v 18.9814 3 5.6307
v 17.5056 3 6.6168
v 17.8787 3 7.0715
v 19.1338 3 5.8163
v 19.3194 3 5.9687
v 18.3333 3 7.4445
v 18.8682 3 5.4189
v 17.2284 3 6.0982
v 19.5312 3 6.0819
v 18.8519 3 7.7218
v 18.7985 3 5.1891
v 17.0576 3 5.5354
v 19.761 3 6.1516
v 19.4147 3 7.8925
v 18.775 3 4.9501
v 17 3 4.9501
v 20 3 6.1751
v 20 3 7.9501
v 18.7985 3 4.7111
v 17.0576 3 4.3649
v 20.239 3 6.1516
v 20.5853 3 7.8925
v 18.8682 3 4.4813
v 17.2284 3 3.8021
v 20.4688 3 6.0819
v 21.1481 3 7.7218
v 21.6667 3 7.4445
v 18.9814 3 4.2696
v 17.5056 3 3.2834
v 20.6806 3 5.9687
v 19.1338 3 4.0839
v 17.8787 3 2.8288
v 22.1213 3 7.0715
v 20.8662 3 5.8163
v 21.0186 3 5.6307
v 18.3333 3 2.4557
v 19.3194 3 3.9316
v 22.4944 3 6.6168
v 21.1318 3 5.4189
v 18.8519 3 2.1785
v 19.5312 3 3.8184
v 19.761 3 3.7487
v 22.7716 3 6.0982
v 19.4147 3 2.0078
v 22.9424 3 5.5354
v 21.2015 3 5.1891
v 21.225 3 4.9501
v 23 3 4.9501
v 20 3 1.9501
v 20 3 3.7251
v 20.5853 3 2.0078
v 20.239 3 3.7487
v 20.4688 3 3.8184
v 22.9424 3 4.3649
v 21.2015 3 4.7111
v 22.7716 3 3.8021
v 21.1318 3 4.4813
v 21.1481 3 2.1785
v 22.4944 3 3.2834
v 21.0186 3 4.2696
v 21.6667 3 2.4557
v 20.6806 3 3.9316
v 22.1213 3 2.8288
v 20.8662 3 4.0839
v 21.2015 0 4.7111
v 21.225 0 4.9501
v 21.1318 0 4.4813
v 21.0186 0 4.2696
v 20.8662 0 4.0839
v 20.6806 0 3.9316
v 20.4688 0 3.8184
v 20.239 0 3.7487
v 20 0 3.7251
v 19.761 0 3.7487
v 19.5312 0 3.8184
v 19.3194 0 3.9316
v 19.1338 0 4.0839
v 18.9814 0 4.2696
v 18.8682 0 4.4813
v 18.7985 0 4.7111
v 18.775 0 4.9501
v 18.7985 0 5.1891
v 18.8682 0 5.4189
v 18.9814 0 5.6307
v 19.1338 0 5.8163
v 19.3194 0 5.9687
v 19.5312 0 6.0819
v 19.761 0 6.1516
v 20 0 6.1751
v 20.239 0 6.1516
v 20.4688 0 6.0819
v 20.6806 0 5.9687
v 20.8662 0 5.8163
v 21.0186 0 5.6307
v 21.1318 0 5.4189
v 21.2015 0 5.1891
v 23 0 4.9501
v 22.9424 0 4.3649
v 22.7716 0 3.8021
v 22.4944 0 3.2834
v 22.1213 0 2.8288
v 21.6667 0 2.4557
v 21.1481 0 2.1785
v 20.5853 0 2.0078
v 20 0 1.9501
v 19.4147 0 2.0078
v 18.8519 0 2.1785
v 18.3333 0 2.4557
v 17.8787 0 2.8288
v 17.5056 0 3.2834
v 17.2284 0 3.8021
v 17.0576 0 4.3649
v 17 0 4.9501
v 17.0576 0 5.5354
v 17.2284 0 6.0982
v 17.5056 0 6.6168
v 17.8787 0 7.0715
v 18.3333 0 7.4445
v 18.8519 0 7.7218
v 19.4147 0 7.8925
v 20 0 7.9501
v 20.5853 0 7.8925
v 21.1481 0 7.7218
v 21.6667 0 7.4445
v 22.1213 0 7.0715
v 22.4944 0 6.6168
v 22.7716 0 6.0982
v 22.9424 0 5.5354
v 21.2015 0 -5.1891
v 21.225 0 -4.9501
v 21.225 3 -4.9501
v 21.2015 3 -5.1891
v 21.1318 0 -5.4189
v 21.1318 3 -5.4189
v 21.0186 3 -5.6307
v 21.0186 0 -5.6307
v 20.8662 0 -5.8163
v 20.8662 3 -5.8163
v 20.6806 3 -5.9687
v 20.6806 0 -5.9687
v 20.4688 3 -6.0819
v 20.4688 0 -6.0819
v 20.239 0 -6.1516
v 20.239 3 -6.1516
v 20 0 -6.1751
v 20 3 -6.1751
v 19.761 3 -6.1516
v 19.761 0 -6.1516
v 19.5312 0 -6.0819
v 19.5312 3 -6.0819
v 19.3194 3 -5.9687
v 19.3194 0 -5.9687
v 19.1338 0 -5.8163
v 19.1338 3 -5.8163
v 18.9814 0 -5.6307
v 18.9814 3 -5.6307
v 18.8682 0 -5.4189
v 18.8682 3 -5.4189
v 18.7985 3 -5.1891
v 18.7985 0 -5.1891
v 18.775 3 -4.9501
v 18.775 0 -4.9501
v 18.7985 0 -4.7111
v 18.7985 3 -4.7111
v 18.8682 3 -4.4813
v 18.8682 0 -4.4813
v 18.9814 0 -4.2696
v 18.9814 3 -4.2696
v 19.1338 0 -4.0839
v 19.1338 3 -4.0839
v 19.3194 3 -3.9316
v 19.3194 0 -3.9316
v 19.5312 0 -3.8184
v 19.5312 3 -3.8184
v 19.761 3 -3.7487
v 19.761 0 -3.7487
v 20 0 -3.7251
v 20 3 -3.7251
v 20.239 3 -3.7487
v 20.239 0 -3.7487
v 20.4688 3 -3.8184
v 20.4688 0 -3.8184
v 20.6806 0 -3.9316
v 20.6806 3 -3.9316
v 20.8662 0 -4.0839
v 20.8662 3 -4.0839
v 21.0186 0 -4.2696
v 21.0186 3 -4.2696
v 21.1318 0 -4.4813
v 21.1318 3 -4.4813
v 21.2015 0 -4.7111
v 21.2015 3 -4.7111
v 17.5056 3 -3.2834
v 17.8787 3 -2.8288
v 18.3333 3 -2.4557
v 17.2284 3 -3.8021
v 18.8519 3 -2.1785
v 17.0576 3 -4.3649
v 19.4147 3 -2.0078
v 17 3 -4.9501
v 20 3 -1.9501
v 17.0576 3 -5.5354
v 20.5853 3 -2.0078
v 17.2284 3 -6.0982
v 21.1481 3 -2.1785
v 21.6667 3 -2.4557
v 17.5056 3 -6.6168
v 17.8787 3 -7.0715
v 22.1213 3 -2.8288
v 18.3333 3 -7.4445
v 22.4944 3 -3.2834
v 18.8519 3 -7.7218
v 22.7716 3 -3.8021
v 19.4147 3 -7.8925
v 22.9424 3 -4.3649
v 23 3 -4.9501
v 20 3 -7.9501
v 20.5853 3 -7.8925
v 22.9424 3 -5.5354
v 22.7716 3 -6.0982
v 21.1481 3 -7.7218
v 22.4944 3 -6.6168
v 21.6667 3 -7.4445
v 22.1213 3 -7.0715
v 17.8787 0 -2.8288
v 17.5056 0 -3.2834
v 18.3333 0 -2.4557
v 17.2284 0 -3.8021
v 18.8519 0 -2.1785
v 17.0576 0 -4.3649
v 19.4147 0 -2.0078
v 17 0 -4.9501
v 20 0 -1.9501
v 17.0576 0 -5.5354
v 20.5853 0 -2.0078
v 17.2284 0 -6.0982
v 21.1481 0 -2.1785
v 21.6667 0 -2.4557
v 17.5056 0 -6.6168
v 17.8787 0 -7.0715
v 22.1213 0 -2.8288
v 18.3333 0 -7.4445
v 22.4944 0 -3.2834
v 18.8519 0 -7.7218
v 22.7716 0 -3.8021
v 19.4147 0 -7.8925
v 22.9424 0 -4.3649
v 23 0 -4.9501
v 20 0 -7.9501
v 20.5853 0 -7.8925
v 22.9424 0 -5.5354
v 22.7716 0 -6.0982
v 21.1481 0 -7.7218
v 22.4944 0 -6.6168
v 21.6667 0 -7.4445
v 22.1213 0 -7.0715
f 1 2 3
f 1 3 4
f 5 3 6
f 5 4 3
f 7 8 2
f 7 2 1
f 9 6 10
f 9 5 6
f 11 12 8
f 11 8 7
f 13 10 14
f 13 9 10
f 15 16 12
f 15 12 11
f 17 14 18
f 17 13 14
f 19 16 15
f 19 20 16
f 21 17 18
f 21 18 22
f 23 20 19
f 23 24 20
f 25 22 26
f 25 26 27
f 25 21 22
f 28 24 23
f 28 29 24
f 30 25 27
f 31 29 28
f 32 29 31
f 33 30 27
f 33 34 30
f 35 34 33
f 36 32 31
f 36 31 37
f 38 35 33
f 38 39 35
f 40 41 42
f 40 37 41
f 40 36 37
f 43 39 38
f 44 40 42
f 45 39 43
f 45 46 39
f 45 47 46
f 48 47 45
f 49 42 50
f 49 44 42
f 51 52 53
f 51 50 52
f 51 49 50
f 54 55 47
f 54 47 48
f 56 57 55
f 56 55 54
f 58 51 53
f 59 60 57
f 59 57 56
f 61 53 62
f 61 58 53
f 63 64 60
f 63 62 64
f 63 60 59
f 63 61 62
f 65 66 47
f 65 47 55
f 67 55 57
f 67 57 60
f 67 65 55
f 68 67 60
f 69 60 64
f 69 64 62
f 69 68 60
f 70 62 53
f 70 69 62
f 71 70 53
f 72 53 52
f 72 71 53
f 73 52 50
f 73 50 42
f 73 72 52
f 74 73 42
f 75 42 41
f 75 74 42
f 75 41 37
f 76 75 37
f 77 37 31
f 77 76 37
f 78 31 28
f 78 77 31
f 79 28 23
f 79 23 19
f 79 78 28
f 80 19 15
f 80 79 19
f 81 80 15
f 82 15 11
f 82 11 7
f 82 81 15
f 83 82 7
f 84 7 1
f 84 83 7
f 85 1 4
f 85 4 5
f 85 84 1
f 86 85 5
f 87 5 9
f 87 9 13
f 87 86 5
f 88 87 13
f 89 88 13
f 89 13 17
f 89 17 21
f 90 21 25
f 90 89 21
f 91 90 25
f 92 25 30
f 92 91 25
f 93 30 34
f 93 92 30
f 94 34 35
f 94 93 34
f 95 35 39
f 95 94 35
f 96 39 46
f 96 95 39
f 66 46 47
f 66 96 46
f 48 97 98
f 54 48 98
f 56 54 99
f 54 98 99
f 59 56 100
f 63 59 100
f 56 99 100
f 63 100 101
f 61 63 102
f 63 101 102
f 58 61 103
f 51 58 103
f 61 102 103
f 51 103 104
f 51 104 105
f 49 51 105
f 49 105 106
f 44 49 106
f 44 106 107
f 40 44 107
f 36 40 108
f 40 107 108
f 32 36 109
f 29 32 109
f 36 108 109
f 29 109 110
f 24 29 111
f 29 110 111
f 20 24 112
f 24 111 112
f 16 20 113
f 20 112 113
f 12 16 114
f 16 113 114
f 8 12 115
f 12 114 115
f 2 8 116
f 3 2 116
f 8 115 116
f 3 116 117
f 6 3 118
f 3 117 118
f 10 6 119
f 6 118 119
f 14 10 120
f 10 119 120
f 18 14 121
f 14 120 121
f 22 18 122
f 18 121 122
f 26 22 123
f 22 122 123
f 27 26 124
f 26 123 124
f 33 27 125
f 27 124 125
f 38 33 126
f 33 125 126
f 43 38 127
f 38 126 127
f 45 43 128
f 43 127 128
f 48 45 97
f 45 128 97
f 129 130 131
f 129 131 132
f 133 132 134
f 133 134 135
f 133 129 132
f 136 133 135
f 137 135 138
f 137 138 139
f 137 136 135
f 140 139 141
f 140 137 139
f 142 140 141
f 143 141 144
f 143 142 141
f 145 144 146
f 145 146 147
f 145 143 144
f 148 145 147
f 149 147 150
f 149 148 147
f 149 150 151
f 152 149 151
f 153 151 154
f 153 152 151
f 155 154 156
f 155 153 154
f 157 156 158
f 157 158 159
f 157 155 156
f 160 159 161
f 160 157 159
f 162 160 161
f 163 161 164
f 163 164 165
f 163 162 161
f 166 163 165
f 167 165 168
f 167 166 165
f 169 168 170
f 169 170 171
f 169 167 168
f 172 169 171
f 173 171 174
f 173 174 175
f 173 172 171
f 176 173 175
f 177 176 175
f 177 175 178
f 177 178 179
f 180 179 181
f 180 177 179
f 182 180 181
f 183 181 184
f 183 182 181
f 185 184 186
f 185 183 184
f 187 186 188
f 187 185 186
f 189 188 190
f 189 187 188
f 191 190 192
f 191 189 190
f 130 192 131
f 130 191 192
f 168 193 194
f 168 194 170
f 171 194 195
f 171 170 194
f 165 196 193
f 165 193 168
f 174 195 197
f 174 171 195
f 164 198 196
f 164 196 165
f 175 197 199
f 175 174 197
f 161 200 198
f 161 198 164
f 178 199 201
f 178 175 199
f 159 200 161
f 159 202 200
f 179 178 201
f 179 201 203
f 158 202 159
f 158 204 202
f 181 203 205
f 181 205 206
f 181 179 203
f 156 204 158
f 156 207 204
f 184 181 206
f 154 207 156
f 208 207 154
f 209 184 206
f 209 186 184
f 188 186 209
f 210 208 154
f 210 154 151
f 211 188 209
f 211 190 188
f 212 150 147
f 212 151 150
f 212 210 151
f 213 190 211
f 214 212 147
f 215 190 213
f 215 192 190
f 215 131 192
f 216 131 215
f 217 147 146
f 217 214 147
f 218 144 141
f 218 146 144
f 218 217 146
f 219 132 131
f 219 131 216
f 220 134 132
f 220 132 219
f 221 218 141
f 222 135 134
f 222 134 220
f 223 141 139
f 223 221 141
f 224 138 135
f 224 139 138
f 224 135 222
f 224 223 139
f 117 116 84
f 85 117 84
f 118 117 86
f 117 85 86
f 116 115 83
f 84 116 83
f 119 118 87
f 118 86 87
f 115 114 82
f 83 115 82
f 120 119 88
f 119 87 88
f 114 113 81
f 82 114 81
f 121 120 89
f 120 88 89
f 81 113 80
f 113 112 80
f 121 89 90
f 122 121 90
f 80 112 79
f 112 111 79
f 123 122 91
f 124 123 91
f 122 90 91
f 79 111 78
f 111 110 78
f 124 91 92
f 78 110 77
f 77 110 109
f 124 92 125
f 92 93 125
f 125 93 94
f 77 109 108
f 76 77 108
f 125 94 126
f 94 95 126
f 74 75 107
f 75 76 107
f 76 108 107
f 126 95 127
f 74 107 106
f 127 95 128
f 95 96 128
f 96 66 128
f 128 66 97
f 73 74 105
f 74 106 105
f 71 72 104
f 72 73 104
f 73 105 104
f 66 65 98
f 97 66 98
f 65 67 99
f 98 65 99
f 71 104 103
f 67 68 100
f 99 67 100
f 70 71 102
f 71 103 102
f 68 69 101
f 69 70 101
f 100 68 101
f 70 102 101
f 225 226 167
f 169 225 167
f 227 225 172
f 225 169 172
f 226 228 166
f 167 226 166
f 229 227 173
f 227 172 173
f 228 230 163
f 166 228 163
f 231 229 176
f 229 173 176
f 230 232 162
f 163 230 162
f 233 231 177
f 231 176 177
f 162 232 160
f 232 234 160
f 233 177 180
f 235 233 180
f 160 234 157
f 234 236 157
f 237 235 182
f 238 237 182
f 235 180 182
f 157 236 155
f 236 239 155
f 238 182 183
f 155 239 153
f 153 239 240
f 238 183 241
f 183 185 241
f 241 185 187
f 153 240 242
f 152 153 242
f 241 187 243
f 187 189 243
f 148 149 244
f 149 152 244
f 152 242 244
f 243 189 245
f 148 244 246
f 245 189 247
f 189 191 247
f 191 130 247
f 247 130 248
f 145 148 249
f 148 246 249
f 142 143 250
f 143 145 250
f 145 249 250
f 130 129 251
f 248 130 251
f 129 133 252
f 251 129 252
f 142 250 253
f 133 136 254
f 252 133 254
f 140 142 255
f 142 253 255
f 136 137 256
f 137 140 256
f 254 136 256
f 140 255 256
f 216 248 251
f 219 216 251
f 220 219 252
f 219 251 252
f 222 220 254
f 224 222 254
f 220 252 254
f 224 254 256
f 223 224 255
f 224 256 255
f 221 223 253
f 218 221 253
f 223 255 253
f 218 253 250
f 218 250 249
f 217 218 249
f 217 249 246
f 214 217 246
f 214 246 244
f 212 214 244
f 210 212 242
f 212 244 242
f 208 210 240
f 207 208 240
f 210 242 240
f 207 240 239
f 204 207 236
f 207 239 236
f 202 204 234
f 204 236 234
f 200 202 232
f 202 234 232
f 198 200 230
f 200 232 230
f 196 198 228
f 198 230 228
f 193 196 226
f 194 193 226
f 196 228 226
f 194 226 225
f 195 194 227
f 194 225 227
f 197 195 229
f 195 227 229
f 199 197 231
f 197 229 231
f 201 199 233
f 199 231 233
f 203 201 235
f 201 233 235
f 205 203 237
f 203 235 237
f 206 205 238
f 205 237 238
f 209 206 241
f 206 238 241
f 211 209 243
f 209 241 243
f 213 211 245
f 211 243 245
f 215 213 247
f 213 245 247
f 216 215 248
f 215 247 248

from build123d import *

# Parameters (mm, degrees)
SKETCH_1_R          = 3
SKETCH_1_R_2        = 1.05
EXTRUDE_1_DEPTH     = 3
EXTRUDE_1_2_DEPTH   = 3
SKETCH_1_R_3        = 1.075
EXTRUDE_1_3_DEPTH   = 3
EXTRUDE_1_4_DEPTH   = 3
SKETCH_1_R_4        = 1.225
EXTRUDE_1_5_DEPTH   = 3
EXTRUDE_1_6_DEPTH   = 3
SKETCH_1_R_5        = 1.125
EXTRUDE_1_7_DEPTH   = 3
EXTRUDE_1_8_DEPTH   = 3
SKETCH_2_W          = 22.049293563
SKETCH_2_H          = 26.57793635
SKETCH_2_W_2        = 15.516169545
SKETCH_2_H_2        = 27.468816898
CUT_EXTRUDE_3_DEPTH = 4


with BuildPart() as part:
    # 草图1 → 凸台-拉伸1 (new body)
    with BuildSketch(Plane(origin=(0, 0, 0), x_dir=(1, 0, 0), z_dir=(0, 1, 0))):
        with Locations((0, 4.950130432)):
            Circle(SKETCH_1_R)
        with Locations((0, 4.950130432)):
            Circle(SKETCH_1_R_2, mode=Mode.SUBTRACT)
    extrude(amount=EXTRUDE_1_DEPTH)


with BuildPart() as body_2:
    # 草图1 → Extrude 1 2 (new body)
    with BuildSketch(Plane(origin=(0, 0, 0), x_dir=(1, 0, 0), z_dir=(0, 1, 0))):
        with Locations((0, -4.950130432)):
            Circle(SKETCH_1_R)
        with Locations((0, -4.950130432)):
            Circle(SKETCH_1_R_2, mode=Mode.SUBTRACT)
    extrude(amount=EXTRUDE_1_2_DEPTH)


with BuildPart() as body_3:
    # 草图1 → Extrude 1 3 (new body)
    with BuildSketch(Plane(origin=(0, 0, 0), x_dir=(1, 0, 0), z_dir=(0, 1, 0))):
        with Locations((10, -4.950130432)):
            Circle(SKETCH_1_R)
        with Locations((10, -4.950130432)):
            Circle(SKETCH_1_R_3, mode=Mode.SUBTRACT)
    extrude(amount=EXTRUDE_1_3_DEPTH)


with BuildPart() as body_4:
    # 草图1 → Extrude 1 4 (new body)
    with BuildSketch(Plane(origin=(0, 0, 0), x_dir=(1, 0, 0), z_dir=(0, 1, 0))):
        with Locations((10, 4.950130432)):
            Circle(SKETCH_1_R)
        with Locations((10, 4.950130432)):
            Circle(SKETCH_1_R_3, mode=Mode.SUBTRACT)
    extrude(amount=EXTRUDE_1_4_DEPTH)


with BuildPart() as body_5:
    # 草图1 → Extrude 1 5 (new body)
    with BuildSketch(Plane(origin=(0, 0, 0), x_dir=(1, 0, 0), z_dir=(0, 1, 0))):
        with Locations((20, -4.950130432)):
            Circle(SKETCH_1_R)
        with Locations((20, -4.950130432)):
            Circle(SKETCH_1_R_4, mode=Mode.SUBTRACT)
    extrude(amount=EXTRUDE_1_5_DEPTH)


with BuildPart() as body_6:
    # 草图1 → Extrude 1 6 (new body)
    with BuildSketch(Plane(origin=(0, 0, 0), x_dir=(1, 0, 0), z_dir=(0, 1, 0))):
        with Locations((20, 4.950130432)):
            Circle(SKETCH_1_R)
        with Locations((20, 4.950130432)):
            Circle(SKETCH_1_R_4, mode=Mode.SUBTRACT)
    extrude(amount=EXTRUDE_1_6_DEPTH)


with BuildPart() as body_7:
    # 草图1 → Extrude 1 7 (new body)
    with BuildSketch(Plane(origin=(0, 0, 0), x_dir=(1, 0, 0), z_dir=(0, 1, 0))):
        with Locations((30, -4.950130432)):
            Circle(SKETCH_1_R)
        with Locations((30, -4.950130432)):
            Circle(SKETCH_1_R_5, mode=Mode.SUBTRACT)
    extrude(amount=EXTRUDE_1_7_DEPTH)


with BuildPart() as body_8:
    # 草图1 → Extrude 1 8 (new body)
    with BuildSketch(Plane(origin=(0, 0, 0), x_dir=(1, 0, 0), z_dir=(0, 1, 0))):
        with Locations((30, 4.950130432)):
            Circle(SKETCH_1_R)
        with Locations((30, 4.950130432)):
            Circle(SKETCH_1_R_5, mode=Mode.SUBTRACT)
    extrude(amount=EXTRUDE_1_8_DEPTH)


with BuildPart() as cut_extrude_3_tool:
    # 草图2 → 切除-拉伸3 (new body, through all)
    with BuildSketch(Plane(origin=(0, 0, 0), x_dir=(1, 0, 0), z_dir=(0, 1, 0))):
        with Locations((4.346553446, -2.004481233)):
            Rectangle(SKETCH_2_W, SKETCH_2_H)
        with Locations((33.003211075, -0.668160411)):
            Rectangle(SKETCH_2_W_2, SKETCH_2_H_2)
    extrude(amount=CUT_EXTRUDE_3_DEPTH)


with BuildPart() as part_1:
    add(part.part)

    # 切除-拉伸3: cut by cut_extrude_3_tool
    add(cut_extrude_3_tool.part, mode=Mode.SUBTRACT)


with BuildPart() as body_2_1:
    add(body_2.part)

    # 切除-拉伸3: cut by cut_extrude_3_tool
    add(cut_extrude_3_tool.part, mode=Mode.SUBTRACT)


with BuildPart() as body_3_1:
    add(body_3.part)

    # 切除-拉伸3: cut by cut_extrude_3_tool
    add(cut_extrude_3_tool.part, mode=Mode.SUBTRACT)


with BuildPart() as body_4_1:
    add(body_4.part)

    # 切除-拉伸3: cut by cut_extrude_3_tool
    add(cut_extrude_3_tool.part, mode=Mode.SUBTRACT)


with BuildPart() as body_7_1:
    add(body_7.part)

    # 切除-拉伸3: cut by cut_extrude_3_tool
    add(cut_extrude_3_tool.part, mode=Mode.SUBTRACT)


with BuildPart() as body_8_1:
    add(body_8.part)

    # 切除-拉伸3: cut by cut_extrude_3_tool
    add(cut_extrude_3_tool.part, mode=Mode.SUBTRACT)


solid = Compound([body_5.part, body_6.part])
